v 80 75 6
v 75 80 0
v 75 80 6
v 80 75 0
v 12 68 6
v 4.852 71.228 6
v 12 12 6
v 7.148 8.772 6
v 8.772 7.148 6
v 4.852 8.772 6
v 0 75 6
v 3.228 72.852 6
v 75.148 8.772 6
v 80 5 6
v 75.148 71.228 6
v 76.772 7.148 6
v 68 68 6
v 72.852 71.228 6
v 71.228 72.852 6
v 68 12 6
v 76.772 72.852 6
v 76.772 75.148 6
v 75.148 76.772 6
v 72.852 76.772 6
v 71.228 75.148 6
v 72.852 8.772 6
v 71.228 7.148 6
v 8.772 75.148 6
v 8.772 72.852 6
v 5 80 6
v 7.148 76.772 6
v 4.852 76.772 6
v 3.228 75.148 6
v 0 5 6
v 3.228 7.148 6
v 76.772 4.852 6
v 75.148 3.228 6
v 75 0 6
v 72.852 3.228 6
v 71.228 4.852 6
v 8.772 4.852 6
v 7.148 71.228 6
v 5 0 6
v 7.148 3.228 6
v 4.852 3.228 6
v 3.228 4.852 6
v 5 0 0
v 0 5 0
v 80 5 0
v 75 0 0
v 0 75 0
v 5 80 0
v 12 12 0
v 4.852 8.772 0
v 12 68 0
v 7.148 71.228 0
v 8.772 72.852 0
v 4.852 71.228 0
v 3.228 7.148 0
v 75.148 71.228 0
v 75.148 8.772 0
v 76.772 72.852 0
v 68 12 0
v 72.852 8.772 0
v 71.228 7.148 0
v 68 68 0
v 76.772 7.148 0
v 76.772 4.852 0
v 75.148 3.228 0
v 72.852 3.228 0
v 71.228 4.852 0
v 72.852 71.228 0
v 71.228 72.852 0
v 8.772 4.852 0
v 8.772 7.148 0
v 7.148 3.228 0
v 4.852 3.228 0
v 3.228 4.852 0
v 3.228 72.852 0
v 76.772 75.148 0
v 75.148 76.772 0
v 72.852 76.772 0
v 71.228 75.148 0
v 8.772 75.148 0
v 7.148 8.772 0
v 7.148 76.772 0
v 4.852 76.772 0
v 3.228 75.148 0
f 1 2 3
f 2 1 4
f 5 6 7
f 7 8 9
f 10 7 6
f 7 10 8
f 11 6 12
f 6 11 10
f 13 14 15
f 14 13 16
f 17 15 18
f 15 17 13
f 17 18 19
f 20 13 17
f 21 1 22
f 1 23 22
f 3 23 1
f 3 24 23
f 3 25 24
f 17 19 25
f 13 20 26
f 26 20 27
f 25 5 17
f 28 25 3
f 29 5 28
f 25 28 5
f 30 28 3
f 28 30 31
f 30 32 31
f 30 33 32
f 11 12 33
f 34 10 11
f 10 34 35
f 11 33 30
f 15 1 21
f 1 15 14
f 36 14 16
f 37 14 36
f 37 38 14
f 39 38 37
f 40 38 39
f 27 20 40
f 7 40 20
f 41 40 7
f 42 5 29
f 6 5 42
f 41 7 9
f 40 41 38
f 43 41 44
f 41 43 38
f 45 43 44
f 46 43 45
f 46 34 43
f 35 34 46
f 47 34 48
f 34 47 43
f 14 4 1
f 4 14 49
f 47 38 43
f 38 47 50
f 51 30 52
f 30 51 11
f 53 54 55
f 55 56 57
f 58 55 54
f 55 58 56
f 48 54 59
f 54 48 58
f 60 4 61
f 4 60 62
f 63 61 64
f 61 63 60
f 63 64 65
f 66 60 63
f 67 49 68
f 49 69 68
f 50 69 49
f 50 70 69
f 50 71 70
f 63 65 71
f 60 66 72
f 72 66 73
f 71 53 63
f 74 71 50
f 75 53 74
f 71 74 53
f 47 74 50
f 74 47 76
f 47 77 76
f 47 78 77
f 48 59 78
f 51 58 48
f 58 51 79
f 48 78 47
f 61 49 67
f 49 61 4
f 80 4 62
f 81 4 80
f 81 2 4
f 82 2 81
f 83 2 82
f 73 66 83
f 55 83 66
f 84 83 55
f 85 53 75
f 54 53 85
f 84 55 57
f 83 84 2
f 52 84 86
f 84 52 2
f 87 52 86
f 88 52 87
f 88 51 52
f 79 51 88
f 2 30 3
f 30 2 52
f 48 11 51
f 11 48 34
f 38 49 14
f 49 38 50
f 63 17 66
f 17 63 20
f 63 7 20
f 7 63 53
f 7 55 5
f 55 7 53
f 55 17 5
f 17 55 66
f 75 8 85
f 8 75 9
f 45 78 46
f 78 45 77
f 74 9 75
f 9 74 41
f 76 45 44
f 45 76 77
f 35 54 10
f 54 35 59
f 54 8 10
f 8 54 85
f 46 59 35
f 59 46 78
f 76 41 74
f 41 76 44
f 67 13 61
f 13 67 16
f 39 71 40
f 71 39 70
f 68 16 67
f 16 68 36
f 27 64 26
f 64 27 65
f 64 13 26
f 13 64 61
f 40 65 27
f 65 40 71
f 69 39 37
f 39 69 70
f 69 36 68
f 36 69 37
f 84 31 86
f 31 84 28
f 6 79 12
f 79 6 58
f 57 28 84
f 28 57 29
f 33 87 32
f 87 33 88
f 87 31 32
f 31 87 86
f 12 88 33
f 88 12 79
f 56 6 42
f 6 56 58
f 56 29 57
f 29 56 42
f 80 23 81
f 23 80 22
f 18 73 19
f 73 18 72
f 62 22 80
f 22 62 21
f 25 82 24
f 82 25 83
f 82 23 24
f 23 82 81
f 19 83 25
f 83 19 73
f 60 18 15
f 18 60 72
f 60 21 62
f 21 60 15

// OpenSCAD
$fn = 32;

// ----------------------------------------------------------------------
// Frame plate: 80 x 80 frame, 12 mm rails
// ----------------------------------------------------------------------

// --- parameters (mm) ---
plate_l = 80;             // plate length, X
plate_w = 80;             // plate width, Y
plate_t = 6;              // plate thickness, Z (extrusion height)
corner_c = 5;             // corner chamfer
frame_bar = 12;           // frame rail width
bolt_r = 3;               // corner bolt window radius
bolt_inset = 6;           // bolt centre inset from the edges

win_l = plate_l - 2 * frame_bar;  // window length
win_w = plate_w - 2 * frame_bar;  // window width
bolt_d = 2 * bolt_r;  // corner hole diameter

profile = [[5, 0], [75, 0], [80, 5], [80, 75], [75, 80], [5, 80], [0, 75], [0, 5]];  // primary outline, 8 points, counter clockwise
void_1 = [[12, 12], [68, 12], [68, 68], [12, 68]];  // the window, 4 points
void_2 = [[8.772, 7.148], [7.148, 8.772], [4.852, 8.772], [3.228, 7.148], [3.228, 4.852], [4.852, 3.228], [7.148, 3.228], [8.772, 4.852]];  // corner bolt window, 8 points
void_3 = [[76.772, 7.148], [75.148, 8.772], [72.852, 8.772], [71.228, 7.148], [71.228, 4.852], [72.852, 3.228], [75.148, 3.228], [76.772, 4.852]];  // corner bolt window, 8 points
void_4 = [[8.772, 75.148], [7.148, 76.772], [4.852, 76.772], [3.228, 75.148], [3.228, 72.852], [4.852, 71.228], [7.148, 71.228], [8.772, 72.852]];  // corner bolt window, 8 points
void_5 = [[76.772, 75.148], [75.148, 76.772], [72.852, 76.772], [71.228, 75.148], [71.228, 72.852], [72.852, 71.228], [75.148, 71.228], [76.772, 72.852]];  // corner bolt window, 8 points

// --- the one profile operation ---
difference() {
  linear_extrude(height = plate_t) polygon(points = profile);
  translate([0, 0, -1])
    linear_extrude(height = plate_t + 2) polygon(points = void_1);
  translate([0, 0, -1])
    linear_extrude(height = plate_t + 2) polygon(points = void_2);
  translate([0, 0, -1])
    linear_extrude(height = plate_t + 2) polygon(points = void_3);
  translate([0, 0, -1])
    linear_extrude(height = plate_t + 2) polygon(points = void_4);
  translate([0, 0, -1])
    linear_extrude(height = plate_t + 2) polygon(points = void_5);
}
